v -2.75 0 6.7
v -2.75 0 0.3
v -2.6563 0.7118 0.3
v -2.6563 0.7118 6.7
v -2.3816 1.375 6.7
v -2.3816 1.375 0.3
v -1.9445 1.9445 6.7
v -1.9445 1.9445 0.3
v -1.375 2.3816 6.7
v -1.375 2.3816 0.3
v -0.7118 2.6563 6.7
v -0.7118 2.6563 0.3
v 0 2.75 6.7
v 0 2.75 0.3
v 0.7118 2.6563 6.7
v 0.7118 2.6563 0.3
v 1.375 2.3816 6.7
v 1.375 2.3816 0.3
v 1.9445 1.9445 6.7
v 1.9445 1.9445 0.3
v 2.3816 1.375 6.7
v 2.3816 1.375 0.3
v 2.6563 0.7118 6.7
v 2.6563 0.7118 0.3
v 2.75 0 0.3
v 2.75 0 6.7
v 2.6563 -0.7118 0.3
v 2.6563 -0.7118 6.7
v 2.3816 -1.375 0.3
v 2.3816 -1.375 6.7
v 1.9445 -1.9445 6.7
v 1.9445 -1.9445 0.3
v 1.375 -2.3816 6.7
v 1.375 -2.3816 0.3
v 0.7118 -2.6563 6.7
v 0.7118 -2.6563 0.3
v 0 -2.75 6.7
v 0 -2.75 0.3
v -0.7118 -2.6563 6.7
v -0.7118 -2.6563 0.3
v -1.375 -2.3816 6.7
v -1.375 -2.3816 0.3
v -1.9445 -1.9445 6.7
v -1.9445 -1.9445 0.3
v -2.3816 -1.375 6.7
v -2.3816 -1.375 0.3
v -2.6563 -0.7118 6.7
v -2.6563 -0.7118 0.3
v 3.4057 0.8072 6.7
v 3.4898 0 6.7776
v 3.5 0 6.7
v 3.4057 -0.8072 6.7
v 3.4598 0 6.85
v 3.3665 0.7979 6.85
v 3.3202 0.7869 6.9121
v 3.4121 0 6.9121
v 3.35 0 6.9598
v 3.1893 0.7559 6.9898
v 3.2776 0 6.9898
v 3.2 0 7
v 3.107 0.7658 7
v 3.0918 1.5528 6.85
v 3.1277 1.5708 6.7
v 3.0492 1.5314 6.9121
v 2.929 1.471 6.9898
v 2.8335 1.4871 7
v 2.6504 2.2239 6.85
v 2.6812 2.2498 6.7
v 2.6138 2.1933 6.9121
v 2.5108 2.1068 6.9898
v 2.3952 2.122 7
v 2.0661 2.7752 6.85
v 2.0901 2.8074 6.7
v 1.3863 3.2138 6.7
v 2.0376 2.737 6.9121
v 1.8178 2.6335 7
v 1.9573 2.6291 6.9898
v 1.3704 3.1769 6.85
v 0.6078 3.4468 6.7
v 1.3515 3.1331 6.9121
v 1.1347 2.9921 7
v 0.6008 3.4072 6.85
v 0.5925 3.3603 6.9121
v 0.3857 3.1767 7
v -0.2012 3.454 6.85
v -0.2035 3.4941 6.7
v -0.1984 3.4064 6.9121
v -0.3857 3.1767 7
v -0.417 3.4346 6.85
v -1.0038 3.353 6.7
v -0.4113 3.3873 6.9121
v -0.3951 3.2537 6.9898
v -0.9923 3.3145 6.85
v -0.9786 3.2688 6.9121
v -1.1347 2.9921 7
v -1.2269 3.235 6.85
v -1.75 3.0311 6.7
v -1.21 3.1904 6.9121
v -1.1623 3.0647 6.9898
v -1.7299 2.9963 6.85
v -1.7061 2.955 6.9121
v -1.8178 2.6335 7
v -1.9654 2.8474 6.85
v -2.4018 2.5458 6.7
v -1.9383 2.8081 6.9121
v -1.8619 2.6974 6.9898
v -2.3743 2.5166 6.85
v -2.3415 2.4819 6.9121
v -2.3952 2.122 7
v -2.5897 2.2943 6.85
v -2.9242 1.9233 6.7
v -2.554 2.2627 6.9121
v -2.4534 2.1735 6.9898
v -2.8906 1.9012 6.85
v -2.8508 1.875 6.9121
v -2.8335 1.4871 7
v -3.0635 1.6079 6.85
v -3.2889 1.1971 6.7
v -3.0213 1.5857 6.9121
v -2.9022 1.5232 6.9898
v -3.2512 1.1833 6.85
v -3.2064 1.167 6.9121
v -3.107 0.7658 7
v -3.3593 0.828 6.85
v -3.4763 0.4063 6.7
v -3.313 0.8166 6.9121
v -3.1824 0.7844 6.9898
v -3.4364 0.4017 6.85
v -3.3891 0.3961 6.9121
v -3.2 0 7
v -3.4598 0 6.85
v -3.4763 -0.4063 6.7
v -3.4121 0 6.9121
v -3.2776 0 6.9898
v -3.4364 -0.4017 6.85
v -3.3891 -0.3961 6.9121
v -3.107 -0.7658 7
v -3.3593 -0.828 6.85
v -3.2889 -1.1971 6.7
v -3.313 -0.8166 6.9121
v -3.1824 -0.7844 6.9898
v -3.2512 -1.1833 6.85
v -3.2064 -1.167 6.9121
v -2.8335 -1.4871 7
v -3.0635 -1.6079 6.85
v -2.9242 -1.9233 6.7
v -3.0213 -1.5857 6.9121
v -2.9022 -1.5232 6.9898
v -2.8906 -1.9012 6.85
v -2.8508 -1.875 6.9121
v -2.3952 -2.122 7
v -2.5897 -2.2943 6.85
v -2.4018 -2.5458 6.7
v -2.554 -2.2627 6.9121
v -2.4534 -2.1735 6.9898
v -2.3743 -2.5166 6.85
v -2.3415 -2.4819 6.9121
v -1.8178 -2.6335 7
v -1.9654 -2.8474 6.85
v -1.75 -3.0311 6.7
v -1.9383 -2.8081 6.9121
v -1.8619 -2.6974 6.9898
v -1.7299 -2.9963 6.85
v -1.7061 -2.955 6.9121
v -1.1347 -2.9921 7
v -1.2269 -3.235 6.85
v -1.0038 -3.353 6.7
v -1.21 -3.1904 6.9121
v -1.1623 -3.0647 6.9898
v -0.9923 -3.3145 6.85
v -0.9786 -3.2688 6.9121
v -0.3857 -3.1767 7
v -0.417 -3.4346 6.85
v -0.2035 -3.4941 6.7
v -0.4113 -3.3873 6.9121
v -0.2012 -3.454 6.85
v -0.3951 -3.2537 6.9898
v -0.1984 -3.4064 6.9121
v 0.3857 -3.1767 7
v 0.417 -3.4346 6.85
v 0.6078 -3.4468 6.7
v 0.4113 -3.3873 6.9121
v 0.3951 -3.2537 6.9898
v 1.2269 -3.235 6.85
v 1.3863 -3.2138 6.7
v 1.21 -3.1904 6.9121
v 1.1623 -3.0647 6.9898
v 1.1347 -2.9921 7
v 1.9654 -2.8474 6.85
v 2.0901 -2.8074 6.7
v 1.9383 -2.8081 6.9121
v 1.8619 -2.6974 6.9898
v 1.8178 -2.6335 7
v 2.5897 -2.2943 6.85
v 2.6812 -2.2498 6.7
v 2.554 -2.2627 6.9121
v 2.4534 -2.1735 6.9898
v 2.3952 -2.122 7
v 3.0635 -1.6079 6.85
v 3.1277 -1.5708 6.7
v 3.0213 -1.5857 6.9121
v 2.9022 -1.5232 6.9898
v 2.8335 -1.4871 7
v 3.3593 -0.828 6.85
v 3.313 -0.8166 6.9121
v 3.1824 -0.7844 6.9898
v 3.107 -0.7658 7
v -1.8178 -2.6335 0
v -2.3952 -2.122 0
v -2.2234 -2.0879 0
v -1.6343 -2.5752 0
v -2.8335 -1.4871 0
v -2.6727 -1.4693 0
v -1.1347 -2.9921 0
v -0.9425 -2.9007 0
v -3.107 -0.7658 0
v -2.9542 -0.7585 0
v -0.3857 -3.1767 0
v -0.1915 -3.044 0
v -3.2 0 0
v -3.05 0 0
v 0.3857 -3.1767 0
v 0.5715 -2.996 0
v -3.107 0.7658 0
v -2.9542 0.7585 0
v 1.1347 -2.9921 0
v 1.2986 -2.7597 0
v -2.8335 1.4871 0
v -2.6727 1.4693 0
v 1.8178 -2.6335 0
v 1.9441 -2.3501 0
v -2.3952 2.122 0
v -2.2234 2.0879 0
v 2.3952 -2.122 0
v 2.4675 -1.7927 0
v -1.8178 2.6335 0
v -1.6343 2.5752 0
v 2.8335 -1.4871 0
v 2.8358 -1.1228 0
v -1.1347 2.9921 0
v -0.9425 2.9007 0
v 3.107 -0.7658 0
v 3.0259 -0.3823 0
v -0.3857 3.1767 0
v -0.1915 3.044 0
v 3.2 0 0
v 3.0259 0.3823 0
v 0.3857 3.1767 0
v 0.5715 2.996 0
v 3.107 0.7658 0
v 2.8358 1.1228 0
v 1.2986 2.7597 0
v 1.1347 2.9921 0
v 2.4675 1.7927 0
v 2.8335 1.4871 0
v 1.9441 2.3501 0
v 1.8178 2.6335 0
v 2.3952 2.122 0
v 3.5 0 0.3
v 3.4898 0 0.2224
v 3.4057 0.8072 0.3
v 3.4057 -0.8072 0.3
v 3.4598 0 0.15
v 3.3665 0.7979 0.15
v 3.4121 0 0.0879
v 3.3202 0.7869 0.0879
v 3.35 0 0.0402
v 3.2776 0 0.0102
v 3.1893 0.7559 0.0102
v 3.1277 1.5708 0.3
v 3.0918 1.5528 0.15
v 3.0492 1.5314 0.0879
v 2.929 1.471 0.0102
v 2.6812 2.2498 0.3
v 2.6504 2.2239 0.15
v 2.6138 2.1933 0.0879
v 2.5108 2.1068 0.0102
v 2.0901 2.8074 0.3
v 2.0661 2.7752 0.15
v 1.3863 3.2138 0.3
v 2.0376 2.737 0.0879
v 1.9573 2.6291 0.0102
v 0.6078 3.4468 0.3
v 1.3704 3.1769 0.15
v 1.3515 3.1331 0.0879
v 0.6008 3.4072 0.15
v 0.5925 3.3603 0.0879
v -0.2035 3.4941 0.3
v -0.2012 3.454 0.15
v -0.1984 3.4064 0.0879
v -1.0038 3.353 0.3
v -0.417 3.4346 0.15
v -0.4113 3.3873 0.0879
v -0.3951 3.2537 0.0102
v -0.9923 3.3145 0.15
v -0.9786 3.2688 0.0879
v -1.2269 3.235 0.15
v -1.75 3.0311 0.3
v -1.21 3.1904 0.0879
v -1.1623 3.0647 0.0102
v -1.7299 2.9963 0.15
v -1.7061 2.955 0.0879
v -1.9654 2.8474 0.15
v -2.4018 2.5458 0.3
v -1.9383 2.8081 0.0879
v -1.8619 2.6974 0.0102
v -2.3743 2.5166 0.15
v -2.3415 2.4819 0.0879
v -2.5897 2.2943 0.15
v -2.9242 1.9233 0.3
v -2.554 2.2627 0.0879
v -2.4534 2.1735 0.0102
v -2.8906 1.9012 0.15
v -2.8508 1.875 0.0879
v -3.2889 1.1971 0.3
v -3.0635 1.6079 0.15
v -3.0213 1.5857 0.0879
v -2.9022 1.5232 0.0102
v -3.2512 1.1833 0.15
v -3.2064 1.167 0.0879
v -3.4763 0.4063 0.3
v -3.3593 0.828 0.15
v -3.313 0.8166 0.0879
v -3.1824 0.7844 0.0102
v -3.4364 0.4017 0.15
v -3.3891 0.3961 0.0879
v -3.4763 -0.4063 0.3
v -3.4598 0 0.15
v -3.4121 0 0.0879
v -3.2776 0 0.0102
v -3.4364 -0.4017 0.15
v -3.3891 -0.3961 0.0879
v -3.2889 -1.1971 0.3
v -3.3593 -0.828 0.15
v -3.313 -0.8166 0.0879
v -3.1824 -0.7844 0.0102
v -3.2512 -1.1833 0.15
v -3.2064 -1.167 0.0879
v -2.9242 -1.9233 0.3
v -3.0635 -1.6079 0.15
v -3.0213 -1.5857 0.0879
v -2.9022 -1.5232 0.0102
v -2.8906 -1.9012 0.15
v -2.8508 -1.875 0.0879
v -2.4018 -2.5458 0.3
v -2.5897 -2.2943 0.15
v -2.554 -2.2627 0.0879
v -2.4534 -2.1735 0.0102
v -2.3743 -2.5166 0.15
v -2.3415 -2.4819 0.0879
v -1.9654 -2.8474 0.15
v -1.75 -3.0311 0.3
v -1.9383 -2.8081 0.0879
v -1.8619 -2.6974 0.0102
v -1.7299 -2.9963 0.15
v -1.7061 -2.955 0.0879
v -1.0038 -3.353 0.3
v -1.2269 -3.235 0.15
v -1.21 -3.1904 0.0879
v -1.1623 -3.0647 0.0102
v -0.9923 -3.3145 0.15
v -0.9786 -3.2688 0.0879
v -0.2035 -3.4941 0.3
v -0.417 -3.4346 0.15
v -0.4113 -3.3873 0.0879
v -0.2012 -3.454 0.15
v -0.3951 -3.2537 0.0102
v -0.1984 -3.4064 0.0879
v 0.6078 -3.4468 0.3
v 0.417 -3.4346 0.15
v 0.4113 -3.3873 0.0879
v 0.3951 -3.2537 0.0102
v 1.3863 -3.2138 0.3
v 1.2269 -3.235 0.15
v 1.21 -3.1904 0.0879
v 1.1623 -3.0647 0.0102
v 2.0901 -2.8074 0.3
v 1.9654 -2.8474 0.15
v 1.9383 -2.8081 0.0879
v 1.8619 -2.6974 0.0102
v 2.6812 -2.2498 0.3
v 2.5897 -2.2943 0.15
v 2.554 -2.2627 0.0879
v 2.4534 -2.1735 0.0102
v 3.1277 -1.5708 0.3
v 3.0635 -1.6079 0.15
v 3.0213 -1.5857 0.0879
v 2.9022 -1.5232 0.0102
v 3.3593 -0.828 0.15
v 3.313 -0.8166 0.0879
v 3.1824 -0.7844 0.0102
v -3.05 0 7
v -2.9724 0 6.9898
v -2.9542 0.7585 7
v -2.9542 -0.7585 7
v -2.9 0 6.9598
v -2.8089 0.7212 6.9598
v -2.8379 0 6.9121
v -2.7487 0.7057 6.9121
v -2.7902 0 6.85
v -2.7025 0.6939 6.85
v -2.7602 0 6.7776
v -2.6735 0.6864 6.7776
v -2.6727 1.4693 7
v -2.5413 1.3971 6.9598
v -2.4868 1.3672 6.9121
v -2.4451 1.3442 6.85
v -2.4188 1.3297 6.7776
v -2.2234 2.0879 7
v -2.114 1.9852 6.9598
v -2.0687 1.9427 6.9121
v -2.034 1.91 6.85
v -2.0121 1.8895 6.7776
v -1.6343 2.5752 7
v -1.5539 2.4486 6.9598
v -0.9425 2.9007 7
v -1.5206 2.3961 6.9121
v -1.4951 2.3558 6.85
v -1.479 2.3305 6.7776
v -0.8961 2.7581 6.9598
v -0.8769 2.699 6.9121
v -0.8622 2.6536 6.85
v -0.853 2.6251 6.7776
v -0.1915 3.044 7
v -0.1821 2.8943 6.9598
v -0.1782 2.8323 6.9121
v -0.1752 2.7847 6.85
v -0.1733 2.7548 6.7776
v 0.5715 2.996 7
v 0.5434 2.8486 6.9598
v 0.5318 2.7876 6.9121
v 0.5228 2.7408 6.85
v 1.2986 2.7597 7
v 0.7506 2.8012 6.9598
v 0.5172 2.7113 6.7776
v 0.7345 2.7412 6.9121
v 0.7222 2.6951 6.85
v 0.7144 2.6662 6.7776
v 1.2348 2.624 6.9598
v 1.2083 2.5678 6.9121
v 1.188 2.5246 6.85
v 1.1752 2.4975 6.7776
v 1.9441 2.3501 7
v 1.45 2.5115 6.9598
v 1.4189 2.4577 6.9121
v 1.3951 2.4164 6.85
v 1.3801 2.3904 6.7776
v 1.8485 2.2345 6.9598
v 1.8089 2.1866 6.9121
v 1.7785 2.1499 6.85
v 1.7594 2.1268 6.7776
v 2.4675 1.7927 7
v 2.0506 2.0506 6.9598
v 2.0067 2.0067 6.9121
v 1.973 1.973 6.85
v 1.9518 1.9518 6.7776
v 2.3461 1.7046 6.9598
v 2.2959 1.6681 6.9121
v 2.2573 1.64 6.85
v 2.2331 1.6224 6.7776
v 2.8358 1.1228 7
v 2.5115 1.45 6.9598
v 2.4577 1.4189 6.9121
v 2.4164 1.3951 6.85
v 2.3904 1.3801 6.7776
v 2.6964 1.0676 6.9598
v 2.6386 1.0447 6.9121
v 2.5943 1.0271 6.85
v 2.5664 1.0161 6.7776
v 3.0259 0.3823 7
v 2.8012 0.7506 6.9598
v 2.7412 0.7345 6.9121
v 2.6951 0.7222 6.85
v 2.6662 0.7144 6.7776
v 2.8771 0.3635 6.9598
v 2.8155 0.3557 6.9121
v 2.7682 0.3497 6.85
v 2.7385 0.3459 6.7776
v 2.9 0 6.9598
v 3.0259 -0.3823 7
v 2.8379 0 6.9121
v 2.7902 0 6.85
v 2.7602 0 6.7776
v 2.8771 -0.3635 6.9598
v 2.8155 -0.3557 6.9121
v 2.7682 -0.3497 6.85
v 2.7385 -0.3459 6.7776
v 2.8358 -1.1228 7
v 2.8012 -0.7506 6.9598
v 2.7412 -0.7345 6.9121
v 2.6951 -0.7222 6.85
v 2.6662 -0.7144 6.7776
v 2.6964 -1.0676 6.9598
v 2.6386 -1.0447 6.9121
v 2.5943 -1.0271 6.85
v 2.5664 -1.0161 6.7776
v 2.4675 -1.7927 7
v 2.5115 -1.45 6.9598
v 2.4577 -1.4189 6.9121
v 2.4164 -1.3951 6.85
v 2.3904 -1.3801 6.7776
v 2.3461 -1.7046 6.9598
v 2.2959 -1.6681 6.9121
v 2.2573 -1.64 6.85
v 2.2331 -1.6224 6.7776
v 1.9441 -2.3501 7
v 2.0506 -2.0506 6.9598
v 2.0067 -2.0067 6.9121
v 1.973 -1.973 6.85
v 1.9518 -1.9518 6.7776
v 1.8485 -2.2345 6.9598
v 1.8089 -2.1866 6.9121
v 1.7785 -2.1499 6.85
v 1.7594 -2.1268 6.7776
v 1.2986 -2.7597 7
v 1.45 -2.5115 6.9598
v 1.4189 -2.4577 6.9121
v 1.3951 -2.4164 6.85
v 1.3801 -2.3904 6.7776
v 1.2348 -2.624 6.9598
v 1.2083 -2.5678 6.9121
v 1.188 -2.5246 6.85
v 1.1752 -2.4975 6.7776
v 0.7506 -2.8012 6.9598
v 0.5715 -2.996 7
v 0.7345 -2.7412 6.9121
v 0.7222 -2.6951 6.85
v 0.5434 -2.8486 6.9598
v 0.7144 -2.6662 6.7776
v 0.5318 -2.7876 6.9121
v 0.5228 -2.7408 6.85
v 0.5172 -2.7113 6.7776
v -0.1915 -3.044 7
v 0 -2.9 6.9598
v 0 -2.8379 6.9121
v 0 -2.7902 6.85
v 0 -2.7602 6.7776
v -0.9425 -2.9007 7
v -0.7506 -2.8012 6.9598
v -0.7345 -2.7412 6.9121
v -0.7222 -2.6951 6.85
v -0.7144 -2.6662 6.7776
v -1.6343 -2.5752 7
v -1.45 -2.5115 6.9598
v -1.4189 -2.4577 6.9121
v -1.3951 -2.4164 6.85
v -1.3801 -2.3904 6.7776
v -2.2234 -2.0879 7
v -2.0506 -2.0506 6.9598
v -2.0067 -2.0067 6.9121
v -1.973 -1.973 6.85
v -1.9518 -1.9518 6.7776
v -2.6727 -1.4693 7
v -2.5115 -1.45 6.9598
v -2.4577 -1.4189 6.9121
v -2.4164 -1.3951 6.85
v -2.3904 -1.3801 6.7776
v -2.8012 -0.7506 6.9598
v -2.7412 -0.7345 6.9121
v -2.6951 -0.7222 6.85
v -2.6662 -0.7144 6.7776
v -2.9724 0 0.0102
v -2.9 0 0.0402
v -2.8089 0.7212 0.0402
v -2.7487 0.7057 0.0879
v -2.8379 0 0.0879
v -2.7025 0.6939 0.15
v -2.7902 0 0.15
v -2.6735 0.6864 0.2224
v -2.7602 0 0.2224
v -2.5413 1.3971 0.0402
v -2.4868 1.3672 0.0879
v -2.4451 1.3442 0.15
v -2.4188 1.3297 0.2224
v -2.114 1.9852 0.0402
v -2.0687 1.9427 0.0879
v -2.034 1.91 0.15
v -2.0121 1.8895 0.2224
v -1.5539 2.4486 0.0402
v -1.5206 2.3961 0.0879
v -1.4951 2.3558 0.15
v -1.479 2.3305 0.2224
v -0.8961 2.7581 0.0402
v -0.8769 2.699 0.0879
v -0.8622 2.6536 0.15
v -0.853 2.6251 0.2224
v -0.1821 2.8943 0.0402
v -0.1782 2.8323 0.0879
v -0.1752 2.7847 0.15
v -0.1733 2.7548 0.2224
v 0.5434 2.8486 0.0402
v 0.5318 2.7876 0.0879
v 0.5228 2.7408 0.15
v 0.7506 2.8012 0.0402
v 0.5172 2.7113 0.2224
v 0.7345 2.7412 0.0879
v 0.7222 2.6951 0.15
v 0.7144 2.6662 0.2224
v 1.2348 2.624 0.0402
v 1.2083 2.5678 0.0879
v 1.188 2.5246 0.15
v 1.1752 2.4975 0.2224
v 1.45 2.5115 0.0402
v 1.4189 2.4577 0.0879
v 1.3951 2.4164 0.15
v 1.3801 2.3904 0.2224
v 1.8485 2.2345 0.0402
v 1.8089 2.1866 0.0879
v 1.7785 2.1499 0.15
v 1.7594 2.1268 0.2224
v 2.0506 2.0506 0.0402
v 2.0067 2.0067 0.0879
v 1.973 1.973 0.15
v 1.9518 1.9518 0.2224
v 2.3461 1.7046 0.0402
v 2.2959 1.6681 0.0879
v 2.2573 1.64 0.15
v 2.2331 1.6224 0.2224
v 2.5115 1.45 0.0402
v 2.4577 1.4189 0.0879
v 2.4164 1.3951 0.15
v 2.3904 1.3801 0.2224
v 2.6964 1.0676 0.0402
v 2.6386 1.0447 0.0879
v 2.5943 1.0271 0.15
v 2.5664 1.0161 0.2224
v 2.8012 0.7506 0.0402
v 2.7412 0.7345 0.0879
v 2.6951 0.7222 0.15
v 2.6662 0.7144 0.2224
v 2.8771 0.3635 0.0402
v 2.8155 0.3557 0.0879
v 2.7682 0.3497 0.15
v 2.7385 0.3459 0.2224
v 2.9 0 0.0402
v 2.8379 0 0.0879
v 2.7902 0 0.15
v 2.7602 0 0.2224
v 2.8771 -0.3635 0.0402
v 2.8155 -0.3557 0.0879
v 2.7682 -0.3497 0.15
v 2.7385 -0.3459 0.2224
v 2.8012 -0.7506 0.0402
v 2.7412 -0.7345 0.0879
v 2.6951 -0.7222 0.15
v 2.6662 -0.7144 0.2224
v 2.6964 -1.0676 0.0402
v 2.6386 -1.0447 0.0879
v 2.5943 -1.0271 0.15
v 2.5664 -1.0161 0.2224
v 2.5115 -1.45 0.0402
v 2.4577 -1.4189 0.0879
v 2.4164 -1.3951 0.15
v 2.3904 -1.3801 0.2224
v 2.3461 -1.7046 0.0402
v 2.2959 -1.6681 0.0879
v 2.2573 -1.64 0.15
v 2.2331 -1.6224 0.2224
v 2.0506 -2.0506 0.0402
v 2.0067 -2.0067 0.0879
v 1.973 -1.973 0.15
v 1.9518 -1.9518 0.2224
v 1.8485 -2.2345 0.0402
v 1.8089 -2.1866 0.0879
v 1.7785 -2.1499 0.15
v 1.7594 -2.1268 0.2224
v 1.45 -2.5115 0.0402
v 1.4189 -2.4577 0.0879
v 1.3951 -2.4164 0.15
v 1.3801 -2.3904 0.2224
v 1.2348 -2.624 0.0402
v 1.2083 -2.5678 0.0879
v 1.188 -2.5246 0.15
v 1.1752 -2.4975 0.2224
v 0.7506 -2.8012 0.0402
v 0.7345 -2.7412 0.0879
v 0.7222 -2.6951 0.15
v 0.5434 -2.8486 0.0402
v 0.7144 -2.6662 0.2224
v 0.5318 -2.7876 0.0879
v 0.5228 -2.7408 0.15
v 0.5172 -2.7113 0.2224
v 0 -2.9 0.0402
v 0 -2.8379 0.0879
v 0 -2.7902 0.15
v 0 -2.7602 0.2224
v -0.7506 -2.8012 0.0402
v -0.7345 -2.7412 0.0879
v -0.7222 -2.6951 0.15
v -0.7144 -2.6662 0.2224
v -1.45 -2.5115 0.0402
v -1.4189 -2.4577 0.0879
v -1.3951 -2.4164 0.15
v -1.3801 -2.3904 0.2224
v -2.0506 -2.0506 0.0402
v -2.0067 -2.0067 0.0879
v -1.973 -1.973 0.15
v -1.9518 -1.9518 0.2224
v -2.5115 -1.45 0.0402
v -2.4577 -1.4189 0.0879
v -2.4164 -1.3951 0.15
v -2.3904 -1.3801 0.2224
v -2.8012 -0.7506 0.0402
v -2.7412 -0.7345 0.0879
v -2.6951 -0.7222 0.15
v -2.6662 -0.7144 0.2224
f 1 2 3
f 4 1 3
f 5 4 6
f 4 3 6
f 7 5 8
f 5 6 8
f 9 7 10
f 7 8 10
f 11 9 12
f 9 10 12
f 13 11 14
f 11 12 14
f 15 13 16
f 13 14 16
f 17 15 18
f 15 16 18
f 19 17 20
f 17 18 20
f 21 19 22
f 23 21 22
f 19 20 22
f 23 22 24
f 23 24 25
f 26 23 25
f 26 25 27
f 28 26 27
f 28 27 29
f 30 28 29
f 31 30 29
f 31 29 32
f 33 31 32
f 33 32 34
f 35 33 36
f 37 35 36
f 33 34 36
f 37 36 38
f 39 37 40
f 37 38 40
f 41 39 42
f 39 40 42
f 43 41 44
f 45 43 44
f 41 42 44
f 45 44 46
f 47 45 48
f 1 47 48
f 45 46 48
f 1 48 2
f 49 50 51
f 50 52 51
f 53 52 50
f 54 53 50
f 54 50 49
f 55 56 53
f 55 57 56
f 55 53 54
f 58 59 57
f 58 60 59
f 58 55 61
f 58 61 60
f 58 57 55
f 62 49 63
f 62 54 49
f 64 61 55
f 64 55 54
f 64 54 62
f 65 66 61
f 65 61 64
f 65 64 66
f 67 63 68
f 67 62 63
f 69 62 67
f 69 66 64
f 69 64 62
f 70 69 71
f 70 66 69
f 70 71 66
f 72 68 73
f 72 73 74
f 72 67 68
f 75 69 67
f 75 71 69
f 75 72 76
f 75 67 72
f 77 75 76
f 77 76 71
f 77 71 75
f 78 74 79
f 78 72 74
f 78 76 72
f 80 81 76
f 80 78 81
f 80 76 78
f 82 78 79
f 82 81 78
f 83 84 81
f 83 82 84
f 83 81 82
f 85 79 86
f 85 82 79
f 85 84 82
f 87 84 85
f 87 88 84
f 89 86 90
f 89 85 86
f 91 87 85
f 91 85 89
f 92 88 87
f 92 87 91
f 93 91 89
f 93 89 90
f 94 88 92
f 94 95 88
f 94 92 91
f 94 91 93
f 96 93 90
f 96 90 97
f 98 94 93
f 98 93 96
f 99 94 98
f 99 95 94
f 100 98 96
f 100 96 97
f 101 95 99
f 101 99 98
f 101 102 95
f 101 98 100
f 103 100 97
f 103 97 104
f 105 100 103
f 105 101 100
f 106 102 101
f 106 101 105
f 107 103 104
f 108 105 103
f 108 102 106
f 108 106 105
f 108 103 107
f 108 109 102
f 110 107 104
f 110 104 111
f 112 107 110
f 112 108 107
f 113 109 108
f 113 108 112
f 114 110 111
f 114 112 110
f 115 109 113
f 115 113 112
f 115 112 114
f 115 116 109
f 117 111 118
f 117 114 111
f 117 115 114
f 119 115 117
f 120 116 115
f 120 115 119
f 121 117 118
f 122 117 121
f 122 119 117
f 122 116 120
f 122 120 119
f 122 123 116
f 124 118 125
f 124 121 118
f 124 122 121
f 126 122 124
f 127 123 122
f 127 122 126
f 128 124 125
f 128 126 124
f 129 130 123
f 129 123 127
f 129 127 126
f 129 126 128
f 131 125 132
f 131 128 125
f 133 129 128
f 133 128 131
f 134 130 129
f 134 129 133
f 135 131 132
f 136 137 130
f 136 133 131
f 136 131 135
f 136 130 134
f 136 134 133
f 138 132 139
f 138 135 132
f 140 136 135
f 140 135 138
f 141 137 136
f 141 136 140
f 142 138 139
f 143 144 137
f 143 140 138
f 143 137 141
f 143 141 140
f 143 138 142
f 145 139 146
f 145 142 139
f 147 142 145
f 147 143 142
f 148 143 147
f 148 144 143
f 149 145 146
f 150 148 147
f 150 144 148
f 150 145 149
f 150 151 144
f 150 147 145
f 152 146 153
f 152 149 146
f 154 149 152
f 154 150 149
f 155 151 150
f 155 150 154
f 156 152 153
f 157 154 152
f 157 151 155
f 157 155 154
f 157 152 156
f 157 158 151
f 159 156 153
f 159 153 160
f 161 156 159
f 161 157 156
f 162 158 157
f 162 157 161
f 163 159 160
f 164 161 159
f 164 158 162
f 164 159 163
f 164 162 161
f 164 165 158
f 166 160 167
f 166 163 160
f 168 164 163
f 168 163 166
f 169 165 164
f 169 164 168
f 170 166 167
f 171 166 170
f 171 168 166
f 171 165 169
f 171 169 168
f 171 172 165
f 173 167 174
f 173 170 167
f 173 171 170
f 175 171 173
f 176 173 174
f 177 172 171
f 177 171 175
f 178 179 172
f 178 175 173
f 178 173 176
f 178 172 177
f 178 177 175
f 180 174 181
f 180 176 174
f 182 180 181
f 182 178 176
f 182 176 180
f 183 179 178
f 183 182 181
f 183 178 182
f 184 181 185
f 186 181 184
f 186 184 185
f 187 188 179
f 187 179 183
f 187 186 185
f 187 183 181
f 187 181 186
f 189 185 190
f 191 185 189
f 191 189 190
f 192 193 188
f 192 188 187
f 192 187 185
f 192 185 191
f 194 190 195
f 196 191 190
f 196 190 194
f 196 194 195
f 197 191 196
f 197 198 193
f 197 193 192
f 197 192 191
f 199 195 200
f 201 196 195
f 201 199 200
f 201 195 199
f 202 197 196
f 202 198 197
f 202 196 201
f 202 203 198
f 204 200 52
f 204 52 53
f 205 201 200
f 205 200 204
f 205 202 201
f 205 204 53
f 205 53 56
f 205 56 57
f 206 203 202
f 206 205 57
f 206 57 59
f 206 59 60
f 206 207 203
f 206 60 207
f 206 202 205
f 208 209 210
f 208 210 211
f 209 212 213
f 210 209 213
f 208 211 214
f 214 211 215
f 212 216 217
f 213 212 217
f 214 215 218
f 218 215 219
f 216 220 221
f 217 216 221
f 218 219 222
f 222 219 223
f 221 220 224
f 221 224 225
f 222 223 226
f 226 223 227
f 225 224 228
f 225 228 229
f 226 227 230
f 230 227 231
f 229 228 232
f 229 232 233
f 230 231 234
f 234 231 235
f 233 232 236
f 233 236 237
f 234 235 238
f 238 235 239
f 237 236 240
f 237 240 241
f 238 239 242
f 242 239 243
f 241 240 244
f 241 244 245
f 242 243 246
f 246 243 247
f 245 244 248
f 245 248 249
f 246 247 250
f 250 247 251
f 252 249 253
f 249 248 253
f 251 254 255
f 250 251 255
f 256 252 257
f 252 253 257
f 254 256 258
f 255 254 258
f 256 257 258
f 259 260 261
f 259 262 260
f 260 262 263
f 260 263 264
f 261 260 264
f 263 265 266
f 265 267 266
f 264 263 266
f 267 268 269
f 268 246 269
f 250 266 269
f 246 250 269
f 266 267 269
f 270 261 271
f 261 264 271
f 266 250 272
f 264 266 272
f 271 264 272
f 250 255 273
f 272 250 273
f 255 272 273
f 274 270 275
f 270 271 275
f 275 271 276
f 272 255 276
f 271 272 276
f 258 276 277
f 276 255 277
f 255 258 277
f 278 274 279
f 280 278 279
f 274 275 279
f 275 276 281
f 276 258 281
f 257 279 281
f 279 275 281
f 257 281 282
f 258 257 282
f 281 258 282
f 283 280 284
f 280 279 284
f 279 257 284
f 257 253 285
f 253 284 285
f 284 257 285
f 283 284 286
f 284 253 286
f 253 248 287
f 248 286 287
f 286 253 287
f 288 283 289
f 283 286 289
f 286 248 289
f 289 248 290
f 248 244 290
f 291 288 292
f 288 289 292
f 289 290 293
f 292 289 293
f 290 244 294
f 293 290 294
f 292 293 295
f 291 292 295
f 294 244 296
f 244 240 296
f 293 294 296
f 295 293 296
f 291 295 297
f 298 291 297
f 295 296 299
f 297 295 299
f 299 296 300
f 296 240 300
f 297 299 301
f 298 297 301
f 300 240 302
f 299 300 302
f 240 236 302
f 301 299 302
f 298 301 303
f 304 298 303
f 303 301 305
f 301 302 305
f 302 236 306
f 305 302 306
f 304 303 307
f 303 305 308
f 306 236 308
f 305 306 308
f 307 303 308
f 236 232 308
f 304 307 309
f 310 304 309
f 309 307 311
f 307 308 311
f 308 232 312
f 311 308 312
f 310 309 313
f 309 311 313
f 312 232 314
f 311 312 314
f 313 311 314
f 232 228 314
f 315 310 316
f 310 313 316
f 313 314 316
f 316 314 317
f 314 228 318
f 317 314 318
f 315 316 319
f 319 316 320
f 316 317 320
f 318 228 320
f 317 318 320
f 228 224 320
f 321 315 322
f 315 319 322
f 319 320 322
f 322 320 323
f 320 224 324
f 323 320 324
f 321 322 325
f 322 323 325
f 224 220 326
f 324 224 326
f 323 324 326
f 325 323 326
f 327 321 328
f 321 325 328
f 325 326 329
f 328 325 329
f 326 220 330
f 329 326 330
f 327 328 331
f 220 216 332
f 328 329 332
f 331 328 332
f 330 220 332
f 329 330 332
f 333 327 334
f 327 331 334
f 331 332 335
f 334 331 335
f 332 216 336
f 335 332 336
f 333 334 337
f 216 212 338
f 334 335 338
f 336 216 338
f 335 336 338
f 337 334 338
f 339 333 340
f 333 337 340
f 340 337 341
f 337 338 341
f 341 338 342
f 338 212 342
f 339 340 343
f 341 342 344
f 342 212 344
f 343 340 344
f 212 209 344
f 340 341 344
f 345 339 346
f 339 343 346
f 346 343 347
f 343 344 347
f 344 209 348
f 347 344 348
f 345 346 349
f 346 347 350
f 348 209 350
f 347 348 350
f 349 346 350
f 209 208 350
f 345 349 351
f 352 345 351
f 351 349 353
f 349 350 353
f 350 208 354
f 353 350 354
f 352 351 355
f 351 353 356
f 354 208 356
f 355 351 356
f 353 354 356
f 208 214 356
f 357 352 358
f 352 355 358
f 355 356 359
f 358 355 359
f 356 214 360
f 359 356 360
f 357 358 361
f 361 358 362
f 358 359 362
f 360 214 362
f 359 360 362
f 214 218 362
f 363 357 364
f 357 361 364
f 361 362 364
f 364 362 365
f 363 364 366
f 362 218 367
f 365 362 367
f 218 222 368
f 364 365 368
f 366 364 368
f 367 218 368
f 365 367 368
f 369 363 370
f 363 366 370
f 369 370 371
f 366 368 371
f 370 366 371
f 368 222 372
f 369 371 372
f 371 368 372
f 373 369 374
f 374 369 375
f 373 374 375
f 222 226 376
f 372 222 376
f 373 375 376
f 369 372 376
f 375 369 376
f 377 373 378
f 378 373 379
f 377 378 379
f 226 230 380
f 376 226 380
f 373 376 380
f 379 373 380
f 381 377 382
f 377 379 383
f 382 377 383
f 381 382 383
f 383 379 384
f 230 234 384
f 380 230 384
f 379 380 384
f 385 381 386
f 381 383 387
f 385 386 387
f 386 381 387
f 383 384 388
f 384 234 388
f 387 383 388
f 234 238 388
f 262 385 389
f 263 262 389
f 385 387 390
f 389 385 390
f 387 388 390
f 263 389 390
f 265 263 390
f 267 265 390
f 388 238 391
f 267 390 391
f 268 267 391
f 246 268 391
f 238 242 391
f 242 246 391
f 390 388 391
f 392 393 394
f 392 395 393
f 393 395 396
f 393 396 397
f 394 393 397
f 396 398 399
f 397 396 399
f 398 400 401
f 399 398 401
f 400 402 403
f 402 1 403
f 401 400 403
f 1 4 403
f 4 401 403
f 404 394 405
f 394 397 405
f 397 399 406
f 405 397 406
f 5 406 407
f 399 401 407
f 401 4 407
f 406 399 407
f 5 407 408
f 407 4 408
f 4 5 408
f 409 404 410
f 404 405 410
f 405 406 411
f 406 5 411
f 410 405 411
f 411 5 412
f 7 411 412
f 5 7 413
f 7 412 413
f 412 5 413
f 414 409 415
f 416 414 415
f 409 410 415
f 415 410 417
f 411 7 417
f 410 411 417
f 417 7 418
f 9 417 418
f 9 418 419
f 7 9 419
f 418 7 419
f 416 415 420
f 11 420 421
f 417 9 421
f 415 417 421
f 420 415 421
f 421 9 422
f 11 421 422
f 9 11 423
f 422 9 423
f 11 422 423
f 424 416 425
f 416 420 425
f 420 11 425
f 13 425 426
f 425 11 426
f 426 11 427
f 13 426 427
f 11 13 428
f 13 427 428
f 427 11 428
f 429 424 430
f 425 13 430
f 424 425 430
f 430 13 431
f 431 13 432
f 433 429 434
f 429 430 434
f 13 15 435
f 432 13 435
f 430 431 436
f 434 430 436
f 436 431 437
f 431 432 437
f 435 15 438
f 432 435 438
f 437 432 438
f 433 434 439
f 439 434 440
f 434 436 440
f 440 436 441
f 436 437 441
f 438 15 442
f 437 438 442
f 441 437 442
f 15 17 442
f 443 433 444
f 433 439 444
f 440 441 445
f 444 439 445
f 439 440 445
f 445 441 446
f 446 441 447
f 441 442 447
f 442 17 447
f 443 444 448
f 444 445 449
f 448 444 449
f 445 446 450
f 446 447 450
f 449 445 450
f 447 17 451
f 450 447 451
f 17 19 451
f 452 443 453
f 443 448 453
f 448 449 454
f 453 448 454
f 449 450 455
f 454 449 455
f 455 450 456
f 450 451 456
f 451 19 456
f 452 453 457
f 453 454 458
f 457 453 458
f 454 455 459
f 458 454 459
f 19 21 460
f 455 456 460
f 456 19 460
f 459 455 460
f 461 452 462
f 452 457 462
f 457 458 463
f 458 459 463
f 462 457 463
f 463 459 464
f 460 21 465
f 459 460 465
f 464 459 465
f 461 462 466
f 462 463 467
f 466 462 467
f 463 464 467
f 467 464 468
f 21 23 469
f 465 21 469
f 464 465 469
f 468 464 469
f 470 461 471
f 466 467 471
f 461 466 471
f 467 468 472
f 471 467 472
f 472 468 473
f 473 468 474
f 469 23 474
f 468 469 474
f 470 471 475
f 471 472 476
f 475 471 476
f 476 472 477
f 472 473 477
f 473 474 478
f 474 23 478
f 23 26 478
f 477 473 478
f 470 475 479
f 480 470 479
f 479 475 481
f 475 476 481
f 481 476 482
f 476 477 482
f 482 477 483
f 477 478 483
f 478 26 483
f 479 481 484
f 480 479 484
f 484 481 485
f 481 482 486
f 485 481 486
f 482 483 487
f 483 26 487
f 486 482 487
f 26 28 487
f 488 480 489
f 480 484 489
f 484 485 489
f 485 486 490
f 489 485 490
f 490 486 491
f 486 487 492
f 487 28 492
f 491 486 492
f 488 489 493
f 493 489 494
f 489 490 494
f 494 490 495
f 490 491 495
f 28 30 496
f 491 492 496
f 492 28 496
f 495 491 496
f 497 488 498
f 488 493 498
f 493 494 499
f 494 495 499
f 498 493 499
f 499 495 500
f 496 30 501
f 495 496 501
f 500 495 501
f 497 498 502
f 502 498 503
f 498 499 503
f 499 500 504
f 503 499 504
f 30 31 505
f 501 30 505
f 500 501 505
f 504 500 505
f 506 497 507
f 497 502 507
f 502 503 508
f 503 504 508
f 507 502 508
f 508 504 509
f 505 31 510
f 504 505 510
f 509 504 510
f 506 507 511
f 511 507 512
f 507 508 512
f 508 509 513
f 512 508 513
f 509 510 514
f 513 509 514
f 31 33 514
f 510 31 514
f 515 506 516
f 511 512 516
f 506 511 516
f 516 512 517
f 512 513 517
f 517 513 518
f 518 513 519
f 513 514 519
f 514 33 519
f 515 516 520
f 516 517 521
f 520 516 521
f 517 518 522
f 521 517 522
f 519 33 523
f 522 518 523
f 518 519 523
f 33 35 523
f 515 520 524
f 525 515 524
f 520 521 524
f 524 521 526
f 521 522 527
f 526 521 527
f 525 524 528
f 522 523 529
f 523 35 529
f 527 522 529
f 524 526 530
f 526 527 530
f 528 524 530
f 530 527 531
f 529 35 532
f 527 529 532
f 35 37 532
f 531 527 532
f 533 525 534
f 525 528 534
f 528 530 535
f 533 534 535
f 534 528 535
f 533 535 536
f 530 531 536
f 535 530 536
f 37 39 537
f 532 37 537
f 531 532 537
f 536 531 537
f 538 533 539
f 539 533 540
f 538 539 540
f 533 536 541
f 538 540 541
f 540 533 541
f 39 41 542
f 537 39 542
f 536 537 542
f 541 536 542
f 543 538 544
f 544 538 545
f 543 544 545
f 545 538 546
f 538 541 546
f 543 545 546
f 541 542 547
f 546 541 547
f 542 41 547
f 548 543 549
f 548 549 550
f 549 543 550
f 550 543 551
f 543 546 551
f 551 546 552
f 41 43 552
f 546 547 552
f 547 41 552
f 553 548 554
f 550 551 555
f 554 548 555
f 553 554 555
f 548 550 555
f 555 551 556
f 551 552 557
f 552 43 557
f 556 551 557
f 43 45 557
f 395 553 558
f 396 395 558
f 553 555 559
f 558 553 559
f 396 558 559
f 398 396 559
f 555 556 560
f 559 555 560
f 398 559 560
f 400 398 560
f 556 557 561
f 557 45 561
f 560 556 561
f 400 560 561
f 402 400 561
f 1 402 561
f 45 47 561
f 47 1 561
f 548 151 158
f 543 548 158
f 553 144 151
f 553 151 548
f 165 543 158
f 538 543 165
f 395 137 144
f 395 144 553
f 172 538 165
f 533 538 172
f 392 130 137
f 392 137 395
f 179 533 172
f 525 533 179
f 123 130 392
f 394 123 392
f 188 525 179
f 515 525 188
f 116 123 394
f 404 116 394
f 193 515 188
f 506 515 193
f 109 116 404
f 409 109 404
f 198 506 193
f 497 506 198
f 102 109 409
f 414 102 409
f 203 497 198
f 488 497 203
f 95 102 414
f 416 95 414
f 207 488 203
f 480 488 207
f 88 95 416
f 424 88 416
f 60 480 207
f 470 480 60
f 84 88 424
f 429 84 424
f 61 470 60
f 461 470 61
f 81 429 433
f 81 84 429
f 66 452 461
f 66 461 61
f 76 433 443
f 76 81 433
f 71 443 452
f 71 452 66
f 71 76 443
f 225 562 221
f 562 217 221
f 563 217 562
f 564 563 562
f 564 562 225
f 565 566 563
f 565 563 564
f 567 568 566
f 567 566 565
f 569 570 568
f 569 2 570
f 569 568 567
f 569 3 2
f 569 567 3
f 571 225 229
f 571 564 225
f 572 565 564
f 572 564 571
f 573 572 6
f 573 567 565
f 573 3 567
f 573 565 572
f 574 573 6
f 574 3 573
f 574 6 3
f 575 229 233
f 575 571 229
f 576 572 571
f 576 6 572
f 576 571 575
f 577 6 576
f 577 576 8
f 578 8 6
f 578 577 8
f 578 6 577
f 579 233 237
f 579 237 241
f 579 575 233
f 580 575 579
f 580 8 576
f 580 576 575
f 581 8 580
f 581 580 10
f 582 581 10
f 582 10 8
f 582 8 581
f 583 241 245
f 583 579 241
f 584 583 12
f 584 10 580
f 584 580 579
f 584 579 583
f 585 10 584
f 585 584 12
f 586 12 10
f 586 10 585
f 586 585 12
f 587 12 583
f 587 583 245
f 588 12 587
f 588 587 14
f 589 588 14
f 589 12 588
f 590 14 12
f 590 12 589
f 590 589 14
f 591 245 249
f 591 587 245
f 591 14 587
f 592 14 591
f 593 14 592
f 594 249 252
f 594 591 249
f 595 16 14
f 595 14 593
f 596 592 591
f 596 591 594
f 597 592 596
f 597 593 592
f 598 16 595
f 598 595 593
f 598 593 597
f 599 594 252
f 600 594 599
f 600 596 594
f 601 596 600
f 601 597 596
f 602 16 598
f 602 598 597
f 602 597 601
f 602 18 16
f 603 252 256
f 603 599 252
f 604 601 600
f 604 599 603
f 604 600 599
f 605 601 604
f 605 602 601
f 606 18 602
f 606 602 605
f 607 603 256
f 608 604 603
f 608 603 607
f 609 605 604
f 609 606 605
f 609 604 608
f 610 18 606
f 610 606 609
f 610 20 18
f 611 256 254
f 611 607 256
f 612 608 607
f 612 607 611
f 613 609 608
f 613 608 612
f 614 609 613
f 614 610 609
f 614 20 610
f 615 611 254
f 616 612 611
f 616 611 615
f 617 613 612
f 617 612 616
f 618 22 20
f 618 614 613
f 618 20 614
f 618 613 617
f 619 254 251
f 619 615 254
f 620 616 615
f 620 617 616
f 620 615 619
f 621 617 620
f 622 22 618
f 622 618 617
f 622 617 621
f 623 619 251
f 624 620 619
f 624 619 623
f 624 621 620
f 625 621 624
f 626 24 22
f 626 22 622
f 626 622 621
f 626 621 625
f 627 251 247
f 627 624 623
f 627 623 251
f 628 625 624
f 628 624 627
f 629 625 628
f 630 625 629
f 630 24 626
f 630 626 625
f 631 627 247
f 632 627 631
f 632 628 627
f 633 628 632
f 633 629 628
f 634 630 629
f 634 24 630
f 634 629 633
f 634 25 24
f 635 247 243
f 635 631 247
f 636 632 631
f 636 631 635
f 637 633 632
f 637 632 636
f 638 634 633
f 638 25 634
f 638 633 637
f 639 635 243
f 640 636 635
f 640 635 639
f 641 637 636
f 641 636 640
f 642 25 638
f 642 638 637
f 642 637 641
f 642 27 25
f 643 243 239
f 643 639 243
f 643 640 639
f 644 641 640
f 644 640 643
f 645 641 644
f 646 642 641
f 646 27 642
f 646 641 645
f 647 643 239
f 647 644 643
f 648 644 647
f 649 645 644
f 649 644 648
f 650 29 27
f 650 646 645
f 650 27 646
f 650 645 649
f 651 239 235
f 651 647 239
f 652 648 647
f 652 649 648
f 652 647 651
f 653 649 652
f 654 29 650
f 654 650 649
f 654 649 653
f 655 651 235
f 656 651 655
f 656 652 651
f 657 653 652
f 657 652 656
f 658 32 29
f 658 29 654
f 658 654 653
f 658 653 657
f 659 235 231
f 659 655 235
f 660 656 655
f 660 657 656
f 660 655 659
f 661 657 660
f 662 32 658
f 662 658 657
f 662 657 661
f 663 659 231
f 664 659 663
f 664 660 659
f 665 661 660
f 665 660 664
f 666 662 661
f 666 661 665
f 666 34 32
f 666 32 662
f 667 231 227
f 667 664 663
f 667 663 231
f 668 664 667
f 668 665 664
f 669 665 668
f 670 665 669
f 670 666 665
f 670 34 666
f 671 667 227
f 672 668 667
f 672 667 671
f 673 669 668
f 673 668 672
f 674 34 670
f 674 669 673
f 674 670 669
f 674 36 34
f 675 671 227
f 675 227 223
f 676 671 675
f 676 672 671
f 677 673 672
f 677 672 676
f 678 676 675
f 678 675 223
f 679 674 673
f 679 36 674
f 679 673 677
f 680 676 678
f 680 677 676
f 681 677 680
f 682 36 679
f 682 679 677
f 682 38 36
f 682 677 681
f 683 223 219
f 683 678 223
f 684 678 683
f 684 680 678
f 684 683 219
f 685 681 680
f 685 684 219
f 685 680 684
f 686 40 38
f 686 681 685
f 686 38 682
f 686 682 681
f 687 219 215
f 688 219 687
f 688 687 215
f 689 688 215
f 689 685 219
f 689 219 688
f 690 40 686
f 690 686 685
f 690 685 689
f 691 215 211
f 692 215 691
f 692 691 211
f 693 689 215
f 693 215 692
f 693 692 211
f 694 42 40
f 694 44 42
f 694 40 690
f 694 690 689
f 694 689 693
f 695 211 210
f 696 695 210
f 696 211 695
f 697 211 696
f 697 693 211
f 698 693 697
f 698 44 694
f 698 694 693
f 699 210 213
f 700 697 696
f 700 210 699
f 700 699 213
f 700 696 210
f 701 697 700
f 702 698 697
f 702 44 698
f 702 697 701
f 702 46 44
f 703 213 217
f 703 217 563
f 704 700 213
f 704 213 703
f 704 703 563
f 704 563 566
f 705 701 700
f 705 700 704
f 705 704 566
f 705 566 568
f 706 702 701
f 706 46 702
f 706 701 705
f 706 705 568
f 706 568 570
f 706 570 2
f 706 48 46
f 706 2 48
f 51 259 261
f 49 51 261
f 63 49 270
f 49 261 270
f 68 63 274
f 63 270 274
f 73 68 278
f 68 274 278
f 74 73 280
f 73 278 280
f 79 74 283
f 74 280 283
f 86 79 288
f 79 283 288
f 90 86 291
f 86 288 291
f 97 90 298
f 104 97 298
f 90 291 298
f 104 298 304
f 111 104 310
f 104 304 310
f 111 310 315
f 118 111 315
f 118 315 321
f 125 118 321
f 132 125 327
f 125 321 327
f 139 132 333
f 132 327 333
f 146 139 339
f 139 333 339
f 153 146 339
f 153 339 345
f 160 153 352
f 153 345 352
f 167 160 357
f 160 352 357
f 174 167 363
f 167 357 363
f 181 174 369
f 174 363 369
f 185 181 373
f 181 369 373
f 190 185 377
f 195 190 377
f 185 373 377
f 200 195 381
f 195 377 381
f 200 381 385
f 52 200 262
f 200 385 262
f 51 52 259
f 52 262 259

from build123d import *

# Parameters (mm, degrees)
SKETCH1_R           = 3.5
BOSS_EXTRUDE1_DEPTH = 7
SKETCH2_R           = 2.75
CUT_EXTRUDE1_DEPTH  = 7
FILLET2_R           = 0.3
FILLET3_R           = 0.3


with BuildPart() as part:
    # Sketch1 → Boss-Extrude1 (new body)
    with BuildSketch(Plane.XY):
        Circle(SKETCH1_R)
    extrude(amount=BOSS_EXTRUDE1_DEPTH)

    # Sketch2 → Cut-Extrude1 (cut)
    with BuildSketch(Plane(origin=(0, 0, 0), x_dir=(-1, 0, 0), z_dir=(0, 0, -1))):
        Circle(SKETCH2_R)
    extrude(amount=-CUT_EXTRUDE1_DEPTH, mode=Mode.SUBTRACT)

    # Fillet2
    fillet2_edges = [part.edges().sort_by_distance(p)[0] for p in [
        (-3.5, 0, 0),
        (2.75, 0, 7),
        (2.75, 0, 0),
    ]]
    fillet(fillet2_edges, radius=FILLET2_R)

    # Fillet3
    fillet3_edges = [part.edges().sort_by_distance(p)[0] for p in [
        (-3.5, 0, 7),
    ]]
    fillet(fillet3_edges, radius=FILLET3_R)


solid = part.part
